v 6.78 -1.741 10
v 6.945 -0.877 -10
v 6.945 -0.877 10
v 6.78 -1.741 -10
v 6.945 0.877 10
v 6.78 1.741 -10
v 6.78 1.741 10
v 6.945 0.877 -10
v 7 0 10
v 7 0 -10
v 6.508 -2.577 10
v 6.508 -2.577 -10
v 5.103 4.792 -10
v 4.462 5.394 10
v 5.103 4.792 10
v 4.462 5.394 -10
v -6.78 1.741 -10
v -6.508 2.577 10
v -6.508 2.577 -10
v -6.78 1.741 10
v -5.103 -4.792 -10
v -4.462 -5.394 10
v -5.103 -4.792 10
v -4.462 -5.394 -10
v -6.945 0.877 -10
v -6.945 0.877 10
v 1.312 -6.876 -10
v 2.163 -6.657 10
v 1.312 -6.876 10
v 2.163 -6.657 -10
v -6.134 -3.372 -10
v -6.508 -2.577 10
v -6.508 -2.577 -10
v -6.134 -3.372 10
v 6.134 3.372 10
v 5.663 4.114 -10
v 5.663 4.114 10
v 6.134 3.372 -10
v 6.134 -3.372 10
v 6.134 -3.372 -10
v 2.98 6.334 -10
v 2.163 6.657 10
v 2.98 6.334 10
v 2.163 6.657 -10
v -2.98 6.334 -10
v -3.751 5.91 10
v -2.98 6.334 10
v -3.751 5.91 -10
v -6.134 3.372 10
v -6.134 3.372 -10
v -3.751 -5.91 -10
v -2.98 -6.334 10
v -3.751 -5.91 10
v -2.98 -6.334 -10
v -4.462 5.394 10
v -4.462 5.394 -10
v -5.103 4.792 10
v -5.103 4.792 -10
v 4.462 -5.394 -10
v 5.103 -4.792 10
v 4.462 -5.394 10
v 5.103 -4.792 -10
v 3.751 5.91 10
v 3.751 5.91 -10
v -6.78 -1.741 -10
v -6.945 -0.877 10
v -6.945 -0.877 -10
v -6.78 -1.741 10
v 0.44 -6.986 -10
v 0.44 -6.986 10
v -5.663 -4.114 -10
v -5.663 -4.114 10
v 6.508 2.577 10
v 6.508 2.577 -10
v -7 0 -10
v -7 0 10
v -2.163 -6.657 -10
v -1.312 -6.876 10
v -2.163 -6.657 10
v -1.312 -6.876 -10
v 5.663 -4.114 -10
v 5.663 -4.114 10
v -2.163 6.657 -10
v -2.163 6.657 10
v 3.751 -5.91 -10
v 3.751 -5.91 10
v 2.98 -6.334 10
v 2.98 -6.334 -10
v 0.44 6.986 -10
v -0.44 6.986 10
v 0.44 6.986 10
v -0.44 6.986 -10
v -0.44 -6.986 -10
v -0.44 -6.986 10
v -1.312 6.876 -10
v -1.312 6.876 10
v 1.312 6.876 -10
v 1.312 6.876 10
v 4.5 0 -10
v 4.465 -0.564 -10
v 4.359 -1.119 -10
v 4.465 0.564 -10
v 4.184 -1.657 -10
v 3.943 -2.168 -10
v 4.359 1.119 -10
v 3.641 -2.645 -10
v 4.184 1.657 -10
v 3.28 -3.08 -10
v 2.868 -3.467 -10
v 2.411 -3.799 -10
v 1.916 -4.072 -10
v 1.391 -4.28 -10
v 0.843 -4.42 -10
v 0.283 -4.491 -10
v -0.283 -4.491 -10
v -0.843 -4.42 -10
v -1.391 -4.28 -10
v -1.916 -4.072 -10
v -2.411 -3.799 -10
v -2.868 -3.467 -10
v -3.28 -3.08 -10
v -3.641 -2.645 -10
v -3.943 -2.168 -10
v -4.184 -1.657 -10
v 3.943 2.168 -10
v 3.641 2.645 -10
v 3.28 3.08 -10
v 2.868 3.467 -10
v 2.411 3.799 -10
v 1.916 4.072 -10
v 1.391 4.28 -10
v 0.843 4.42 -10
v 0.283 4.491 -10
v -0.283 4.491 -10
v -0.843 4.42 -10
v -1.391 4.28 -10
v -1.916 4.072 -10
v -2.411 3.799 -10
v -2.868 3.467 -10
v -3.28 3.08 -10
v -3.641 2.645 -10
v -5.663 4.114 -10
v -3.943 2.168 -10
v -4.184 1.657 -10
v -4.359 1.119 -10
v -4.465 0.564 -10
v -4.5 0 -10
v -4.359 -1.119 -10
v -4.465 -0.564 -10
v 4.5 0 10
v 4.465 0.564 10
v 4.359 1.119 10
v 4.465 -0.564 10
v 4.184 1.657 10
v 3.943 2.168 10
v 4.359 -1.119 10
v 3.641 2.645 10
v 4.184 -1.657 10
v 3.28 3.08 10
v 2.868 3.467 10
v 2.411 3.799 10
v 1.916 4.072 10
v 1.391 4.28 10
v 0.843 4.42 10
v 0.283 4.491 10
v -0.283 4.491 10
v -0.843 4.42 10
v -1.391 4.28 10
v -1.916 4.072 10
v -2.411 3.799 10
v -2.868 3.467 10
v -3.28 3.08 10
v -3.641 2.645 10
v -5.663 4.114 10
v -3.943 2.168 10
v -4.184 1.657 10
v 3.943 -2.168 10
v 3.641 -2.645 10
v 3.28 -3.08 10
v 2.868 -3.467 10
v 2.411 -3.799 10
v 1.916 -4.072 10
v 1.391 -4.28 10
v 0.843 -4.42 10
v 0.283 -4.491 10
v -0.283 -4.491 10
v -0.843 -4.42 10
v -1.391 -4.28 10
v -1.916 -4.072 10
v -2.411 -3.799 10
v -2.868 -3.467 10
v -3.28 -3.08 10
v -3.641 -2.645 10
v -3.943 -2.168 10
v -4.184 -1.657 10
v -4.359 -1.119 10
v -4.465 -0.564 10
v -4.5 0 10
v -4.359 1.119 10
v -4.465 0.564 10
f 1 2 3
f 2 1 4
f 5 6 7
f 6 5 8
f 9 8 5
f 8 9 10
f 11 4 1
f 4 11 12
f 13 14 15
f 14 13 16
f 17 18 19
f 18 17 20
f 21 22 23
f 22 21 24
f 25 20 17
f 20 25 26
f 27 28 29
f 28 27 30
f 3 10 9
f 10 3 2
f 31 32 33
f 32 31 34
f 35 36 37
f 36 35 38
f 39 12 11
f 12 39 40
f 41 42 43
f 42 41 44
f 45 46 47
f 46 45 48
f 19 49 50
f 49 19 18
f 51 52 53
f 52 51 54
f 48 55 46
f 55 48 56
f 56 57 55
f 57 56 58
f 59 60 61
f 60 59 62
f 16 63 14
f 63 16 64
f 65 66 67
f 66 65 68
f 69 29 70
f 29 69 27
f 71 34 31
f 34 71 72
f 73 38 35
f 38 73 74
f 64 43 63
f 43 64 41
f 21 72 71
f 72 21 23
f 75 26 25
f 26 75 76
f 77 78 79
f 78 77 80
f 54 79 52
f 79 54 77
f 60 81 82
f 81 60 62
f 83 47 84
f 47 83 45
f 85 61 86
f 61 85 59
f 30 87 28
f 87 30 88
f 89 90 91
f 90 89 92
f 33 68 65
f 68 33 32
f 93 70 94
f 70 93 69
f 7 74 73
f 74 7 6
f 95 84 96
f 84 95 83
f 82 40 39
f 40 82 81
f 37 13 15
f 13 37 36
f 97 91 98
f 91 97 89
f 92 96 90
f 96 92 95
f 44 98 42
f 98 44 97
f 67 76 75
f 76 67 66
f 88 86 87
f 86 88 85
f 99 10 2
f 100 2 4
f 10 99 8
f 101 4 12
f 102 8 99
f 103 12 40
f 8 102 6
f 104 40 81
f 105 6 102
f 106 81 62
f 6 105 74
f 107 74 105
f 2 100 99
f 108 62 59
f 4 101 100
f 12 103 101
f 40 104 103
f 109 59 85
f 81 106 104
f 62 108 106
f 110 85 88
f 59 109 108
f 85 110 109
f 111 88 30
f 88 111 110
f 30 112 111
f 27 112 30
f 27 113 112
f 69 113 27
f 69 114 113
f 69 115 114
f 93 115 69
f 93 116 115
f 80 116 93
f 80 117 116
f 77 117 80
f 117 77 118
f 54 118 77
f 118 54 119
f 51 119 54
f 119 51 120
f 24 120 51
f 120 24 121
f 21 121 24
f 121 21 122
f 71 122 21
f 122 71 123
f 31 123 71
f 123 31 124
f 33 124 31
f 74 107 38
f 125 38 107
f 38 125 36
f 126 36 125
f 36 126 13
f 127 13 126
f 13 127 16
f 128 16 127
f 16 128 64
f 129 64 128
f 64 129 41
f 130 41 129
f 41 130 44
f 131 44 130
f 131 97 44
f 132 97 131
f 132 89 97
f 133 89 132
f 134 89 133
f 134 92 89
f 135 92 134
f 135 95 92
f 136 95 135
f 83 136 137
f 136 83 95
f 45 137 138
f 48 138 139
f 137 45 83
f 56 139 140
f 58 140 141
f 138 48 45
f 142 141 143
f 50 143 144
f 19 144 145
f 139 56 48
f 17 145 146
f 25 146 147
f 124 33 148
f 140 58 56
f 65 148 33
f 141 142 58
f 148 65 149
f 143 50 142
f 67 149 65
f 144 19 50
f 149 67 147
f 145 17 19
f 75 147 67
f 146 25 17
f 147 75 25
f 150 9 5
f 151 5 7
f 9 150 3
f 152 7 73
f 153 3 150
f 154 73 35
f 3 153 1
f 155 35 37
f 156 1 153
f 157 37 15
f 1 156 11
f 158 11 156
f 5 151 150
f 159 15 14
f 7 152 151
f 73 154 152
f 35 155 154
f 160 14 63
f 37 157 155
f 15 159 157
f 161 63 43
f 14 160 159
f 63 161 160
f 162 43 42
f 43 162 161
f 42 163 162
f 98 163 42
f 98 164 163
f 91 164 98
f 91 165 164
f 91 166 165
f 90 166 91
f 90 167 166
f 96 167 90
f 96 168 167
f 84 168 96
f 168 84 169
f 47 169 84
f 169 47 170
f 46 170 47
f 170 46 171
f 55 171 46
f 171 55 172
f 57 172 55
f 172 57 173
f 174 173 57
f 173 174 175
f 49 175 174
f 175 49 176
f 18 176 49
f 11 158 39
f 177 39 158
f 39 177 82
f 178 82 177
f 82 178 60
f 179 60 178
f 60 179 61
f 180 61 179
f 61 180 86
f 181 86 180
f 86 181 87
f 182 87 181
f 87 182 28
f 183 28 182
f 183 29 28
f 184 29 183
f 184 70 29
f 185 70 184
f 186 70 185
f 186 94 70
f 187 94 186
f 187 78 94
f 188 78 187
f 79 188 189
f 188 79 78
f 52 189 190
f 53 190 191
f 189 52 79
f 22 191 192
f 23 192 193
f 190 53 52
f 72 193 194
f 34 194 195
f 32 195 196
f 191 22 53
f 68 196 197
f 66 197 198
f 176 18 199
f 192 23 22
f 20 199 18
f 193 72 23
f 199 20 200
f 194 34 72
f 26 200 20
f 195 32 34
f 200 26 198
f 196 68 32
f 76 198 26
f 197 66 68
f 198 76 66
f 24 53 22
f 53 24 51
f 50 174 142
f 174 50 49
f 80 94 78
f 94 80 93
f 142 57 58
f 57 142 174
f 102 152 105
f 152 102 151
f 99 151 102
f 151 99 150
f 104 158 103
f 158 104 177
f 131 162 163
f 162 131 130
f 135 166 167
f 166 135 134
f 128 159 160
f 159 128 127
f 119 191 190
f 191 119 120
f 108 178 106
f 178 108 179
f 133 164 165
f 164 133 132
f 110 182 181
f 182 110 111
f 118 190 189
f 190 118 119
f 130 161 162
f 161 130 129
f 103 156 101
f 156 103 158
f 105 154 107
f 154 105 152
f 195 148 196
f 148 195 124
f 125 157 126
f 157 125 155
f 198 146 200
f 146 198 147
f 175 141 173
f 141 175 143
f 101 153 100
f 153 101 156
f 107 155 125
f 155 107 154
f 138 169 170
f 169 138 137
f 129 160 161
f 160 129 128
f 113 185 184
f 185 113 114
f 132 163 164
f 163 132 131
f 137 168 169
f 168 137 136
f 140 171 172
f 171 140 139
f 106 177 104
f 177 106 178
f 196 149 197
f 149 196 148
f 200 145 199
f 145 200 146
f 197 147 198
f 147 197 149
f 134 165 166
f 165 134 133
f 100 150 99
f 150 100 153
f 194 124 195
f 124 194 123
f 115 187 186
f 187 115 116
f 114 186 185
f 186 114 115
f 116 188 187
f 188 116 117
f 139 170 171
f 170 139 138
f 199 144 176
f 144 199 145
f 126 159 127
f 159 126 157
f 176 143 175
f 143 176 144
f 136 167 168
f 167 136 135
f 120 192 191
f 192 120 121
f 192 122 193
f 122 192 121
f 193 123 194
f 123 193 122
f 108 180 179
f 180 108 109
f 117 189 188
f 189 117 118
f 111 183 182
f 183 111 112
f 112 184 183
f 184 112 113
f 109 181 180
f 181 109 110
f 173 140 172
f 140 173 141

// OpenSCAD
$fn = 50;


difference() {
	union() {
		translate(v = [0, 0, -10.0000000000]) {
			cylinder(h = 20, r = 7.0000000000);
		}
	}
	union() {
		translate(v = [0, 0, -100.0000000000]) {
			cylinder(h = 200, r = 4.5000000000);
		}
	}
}
